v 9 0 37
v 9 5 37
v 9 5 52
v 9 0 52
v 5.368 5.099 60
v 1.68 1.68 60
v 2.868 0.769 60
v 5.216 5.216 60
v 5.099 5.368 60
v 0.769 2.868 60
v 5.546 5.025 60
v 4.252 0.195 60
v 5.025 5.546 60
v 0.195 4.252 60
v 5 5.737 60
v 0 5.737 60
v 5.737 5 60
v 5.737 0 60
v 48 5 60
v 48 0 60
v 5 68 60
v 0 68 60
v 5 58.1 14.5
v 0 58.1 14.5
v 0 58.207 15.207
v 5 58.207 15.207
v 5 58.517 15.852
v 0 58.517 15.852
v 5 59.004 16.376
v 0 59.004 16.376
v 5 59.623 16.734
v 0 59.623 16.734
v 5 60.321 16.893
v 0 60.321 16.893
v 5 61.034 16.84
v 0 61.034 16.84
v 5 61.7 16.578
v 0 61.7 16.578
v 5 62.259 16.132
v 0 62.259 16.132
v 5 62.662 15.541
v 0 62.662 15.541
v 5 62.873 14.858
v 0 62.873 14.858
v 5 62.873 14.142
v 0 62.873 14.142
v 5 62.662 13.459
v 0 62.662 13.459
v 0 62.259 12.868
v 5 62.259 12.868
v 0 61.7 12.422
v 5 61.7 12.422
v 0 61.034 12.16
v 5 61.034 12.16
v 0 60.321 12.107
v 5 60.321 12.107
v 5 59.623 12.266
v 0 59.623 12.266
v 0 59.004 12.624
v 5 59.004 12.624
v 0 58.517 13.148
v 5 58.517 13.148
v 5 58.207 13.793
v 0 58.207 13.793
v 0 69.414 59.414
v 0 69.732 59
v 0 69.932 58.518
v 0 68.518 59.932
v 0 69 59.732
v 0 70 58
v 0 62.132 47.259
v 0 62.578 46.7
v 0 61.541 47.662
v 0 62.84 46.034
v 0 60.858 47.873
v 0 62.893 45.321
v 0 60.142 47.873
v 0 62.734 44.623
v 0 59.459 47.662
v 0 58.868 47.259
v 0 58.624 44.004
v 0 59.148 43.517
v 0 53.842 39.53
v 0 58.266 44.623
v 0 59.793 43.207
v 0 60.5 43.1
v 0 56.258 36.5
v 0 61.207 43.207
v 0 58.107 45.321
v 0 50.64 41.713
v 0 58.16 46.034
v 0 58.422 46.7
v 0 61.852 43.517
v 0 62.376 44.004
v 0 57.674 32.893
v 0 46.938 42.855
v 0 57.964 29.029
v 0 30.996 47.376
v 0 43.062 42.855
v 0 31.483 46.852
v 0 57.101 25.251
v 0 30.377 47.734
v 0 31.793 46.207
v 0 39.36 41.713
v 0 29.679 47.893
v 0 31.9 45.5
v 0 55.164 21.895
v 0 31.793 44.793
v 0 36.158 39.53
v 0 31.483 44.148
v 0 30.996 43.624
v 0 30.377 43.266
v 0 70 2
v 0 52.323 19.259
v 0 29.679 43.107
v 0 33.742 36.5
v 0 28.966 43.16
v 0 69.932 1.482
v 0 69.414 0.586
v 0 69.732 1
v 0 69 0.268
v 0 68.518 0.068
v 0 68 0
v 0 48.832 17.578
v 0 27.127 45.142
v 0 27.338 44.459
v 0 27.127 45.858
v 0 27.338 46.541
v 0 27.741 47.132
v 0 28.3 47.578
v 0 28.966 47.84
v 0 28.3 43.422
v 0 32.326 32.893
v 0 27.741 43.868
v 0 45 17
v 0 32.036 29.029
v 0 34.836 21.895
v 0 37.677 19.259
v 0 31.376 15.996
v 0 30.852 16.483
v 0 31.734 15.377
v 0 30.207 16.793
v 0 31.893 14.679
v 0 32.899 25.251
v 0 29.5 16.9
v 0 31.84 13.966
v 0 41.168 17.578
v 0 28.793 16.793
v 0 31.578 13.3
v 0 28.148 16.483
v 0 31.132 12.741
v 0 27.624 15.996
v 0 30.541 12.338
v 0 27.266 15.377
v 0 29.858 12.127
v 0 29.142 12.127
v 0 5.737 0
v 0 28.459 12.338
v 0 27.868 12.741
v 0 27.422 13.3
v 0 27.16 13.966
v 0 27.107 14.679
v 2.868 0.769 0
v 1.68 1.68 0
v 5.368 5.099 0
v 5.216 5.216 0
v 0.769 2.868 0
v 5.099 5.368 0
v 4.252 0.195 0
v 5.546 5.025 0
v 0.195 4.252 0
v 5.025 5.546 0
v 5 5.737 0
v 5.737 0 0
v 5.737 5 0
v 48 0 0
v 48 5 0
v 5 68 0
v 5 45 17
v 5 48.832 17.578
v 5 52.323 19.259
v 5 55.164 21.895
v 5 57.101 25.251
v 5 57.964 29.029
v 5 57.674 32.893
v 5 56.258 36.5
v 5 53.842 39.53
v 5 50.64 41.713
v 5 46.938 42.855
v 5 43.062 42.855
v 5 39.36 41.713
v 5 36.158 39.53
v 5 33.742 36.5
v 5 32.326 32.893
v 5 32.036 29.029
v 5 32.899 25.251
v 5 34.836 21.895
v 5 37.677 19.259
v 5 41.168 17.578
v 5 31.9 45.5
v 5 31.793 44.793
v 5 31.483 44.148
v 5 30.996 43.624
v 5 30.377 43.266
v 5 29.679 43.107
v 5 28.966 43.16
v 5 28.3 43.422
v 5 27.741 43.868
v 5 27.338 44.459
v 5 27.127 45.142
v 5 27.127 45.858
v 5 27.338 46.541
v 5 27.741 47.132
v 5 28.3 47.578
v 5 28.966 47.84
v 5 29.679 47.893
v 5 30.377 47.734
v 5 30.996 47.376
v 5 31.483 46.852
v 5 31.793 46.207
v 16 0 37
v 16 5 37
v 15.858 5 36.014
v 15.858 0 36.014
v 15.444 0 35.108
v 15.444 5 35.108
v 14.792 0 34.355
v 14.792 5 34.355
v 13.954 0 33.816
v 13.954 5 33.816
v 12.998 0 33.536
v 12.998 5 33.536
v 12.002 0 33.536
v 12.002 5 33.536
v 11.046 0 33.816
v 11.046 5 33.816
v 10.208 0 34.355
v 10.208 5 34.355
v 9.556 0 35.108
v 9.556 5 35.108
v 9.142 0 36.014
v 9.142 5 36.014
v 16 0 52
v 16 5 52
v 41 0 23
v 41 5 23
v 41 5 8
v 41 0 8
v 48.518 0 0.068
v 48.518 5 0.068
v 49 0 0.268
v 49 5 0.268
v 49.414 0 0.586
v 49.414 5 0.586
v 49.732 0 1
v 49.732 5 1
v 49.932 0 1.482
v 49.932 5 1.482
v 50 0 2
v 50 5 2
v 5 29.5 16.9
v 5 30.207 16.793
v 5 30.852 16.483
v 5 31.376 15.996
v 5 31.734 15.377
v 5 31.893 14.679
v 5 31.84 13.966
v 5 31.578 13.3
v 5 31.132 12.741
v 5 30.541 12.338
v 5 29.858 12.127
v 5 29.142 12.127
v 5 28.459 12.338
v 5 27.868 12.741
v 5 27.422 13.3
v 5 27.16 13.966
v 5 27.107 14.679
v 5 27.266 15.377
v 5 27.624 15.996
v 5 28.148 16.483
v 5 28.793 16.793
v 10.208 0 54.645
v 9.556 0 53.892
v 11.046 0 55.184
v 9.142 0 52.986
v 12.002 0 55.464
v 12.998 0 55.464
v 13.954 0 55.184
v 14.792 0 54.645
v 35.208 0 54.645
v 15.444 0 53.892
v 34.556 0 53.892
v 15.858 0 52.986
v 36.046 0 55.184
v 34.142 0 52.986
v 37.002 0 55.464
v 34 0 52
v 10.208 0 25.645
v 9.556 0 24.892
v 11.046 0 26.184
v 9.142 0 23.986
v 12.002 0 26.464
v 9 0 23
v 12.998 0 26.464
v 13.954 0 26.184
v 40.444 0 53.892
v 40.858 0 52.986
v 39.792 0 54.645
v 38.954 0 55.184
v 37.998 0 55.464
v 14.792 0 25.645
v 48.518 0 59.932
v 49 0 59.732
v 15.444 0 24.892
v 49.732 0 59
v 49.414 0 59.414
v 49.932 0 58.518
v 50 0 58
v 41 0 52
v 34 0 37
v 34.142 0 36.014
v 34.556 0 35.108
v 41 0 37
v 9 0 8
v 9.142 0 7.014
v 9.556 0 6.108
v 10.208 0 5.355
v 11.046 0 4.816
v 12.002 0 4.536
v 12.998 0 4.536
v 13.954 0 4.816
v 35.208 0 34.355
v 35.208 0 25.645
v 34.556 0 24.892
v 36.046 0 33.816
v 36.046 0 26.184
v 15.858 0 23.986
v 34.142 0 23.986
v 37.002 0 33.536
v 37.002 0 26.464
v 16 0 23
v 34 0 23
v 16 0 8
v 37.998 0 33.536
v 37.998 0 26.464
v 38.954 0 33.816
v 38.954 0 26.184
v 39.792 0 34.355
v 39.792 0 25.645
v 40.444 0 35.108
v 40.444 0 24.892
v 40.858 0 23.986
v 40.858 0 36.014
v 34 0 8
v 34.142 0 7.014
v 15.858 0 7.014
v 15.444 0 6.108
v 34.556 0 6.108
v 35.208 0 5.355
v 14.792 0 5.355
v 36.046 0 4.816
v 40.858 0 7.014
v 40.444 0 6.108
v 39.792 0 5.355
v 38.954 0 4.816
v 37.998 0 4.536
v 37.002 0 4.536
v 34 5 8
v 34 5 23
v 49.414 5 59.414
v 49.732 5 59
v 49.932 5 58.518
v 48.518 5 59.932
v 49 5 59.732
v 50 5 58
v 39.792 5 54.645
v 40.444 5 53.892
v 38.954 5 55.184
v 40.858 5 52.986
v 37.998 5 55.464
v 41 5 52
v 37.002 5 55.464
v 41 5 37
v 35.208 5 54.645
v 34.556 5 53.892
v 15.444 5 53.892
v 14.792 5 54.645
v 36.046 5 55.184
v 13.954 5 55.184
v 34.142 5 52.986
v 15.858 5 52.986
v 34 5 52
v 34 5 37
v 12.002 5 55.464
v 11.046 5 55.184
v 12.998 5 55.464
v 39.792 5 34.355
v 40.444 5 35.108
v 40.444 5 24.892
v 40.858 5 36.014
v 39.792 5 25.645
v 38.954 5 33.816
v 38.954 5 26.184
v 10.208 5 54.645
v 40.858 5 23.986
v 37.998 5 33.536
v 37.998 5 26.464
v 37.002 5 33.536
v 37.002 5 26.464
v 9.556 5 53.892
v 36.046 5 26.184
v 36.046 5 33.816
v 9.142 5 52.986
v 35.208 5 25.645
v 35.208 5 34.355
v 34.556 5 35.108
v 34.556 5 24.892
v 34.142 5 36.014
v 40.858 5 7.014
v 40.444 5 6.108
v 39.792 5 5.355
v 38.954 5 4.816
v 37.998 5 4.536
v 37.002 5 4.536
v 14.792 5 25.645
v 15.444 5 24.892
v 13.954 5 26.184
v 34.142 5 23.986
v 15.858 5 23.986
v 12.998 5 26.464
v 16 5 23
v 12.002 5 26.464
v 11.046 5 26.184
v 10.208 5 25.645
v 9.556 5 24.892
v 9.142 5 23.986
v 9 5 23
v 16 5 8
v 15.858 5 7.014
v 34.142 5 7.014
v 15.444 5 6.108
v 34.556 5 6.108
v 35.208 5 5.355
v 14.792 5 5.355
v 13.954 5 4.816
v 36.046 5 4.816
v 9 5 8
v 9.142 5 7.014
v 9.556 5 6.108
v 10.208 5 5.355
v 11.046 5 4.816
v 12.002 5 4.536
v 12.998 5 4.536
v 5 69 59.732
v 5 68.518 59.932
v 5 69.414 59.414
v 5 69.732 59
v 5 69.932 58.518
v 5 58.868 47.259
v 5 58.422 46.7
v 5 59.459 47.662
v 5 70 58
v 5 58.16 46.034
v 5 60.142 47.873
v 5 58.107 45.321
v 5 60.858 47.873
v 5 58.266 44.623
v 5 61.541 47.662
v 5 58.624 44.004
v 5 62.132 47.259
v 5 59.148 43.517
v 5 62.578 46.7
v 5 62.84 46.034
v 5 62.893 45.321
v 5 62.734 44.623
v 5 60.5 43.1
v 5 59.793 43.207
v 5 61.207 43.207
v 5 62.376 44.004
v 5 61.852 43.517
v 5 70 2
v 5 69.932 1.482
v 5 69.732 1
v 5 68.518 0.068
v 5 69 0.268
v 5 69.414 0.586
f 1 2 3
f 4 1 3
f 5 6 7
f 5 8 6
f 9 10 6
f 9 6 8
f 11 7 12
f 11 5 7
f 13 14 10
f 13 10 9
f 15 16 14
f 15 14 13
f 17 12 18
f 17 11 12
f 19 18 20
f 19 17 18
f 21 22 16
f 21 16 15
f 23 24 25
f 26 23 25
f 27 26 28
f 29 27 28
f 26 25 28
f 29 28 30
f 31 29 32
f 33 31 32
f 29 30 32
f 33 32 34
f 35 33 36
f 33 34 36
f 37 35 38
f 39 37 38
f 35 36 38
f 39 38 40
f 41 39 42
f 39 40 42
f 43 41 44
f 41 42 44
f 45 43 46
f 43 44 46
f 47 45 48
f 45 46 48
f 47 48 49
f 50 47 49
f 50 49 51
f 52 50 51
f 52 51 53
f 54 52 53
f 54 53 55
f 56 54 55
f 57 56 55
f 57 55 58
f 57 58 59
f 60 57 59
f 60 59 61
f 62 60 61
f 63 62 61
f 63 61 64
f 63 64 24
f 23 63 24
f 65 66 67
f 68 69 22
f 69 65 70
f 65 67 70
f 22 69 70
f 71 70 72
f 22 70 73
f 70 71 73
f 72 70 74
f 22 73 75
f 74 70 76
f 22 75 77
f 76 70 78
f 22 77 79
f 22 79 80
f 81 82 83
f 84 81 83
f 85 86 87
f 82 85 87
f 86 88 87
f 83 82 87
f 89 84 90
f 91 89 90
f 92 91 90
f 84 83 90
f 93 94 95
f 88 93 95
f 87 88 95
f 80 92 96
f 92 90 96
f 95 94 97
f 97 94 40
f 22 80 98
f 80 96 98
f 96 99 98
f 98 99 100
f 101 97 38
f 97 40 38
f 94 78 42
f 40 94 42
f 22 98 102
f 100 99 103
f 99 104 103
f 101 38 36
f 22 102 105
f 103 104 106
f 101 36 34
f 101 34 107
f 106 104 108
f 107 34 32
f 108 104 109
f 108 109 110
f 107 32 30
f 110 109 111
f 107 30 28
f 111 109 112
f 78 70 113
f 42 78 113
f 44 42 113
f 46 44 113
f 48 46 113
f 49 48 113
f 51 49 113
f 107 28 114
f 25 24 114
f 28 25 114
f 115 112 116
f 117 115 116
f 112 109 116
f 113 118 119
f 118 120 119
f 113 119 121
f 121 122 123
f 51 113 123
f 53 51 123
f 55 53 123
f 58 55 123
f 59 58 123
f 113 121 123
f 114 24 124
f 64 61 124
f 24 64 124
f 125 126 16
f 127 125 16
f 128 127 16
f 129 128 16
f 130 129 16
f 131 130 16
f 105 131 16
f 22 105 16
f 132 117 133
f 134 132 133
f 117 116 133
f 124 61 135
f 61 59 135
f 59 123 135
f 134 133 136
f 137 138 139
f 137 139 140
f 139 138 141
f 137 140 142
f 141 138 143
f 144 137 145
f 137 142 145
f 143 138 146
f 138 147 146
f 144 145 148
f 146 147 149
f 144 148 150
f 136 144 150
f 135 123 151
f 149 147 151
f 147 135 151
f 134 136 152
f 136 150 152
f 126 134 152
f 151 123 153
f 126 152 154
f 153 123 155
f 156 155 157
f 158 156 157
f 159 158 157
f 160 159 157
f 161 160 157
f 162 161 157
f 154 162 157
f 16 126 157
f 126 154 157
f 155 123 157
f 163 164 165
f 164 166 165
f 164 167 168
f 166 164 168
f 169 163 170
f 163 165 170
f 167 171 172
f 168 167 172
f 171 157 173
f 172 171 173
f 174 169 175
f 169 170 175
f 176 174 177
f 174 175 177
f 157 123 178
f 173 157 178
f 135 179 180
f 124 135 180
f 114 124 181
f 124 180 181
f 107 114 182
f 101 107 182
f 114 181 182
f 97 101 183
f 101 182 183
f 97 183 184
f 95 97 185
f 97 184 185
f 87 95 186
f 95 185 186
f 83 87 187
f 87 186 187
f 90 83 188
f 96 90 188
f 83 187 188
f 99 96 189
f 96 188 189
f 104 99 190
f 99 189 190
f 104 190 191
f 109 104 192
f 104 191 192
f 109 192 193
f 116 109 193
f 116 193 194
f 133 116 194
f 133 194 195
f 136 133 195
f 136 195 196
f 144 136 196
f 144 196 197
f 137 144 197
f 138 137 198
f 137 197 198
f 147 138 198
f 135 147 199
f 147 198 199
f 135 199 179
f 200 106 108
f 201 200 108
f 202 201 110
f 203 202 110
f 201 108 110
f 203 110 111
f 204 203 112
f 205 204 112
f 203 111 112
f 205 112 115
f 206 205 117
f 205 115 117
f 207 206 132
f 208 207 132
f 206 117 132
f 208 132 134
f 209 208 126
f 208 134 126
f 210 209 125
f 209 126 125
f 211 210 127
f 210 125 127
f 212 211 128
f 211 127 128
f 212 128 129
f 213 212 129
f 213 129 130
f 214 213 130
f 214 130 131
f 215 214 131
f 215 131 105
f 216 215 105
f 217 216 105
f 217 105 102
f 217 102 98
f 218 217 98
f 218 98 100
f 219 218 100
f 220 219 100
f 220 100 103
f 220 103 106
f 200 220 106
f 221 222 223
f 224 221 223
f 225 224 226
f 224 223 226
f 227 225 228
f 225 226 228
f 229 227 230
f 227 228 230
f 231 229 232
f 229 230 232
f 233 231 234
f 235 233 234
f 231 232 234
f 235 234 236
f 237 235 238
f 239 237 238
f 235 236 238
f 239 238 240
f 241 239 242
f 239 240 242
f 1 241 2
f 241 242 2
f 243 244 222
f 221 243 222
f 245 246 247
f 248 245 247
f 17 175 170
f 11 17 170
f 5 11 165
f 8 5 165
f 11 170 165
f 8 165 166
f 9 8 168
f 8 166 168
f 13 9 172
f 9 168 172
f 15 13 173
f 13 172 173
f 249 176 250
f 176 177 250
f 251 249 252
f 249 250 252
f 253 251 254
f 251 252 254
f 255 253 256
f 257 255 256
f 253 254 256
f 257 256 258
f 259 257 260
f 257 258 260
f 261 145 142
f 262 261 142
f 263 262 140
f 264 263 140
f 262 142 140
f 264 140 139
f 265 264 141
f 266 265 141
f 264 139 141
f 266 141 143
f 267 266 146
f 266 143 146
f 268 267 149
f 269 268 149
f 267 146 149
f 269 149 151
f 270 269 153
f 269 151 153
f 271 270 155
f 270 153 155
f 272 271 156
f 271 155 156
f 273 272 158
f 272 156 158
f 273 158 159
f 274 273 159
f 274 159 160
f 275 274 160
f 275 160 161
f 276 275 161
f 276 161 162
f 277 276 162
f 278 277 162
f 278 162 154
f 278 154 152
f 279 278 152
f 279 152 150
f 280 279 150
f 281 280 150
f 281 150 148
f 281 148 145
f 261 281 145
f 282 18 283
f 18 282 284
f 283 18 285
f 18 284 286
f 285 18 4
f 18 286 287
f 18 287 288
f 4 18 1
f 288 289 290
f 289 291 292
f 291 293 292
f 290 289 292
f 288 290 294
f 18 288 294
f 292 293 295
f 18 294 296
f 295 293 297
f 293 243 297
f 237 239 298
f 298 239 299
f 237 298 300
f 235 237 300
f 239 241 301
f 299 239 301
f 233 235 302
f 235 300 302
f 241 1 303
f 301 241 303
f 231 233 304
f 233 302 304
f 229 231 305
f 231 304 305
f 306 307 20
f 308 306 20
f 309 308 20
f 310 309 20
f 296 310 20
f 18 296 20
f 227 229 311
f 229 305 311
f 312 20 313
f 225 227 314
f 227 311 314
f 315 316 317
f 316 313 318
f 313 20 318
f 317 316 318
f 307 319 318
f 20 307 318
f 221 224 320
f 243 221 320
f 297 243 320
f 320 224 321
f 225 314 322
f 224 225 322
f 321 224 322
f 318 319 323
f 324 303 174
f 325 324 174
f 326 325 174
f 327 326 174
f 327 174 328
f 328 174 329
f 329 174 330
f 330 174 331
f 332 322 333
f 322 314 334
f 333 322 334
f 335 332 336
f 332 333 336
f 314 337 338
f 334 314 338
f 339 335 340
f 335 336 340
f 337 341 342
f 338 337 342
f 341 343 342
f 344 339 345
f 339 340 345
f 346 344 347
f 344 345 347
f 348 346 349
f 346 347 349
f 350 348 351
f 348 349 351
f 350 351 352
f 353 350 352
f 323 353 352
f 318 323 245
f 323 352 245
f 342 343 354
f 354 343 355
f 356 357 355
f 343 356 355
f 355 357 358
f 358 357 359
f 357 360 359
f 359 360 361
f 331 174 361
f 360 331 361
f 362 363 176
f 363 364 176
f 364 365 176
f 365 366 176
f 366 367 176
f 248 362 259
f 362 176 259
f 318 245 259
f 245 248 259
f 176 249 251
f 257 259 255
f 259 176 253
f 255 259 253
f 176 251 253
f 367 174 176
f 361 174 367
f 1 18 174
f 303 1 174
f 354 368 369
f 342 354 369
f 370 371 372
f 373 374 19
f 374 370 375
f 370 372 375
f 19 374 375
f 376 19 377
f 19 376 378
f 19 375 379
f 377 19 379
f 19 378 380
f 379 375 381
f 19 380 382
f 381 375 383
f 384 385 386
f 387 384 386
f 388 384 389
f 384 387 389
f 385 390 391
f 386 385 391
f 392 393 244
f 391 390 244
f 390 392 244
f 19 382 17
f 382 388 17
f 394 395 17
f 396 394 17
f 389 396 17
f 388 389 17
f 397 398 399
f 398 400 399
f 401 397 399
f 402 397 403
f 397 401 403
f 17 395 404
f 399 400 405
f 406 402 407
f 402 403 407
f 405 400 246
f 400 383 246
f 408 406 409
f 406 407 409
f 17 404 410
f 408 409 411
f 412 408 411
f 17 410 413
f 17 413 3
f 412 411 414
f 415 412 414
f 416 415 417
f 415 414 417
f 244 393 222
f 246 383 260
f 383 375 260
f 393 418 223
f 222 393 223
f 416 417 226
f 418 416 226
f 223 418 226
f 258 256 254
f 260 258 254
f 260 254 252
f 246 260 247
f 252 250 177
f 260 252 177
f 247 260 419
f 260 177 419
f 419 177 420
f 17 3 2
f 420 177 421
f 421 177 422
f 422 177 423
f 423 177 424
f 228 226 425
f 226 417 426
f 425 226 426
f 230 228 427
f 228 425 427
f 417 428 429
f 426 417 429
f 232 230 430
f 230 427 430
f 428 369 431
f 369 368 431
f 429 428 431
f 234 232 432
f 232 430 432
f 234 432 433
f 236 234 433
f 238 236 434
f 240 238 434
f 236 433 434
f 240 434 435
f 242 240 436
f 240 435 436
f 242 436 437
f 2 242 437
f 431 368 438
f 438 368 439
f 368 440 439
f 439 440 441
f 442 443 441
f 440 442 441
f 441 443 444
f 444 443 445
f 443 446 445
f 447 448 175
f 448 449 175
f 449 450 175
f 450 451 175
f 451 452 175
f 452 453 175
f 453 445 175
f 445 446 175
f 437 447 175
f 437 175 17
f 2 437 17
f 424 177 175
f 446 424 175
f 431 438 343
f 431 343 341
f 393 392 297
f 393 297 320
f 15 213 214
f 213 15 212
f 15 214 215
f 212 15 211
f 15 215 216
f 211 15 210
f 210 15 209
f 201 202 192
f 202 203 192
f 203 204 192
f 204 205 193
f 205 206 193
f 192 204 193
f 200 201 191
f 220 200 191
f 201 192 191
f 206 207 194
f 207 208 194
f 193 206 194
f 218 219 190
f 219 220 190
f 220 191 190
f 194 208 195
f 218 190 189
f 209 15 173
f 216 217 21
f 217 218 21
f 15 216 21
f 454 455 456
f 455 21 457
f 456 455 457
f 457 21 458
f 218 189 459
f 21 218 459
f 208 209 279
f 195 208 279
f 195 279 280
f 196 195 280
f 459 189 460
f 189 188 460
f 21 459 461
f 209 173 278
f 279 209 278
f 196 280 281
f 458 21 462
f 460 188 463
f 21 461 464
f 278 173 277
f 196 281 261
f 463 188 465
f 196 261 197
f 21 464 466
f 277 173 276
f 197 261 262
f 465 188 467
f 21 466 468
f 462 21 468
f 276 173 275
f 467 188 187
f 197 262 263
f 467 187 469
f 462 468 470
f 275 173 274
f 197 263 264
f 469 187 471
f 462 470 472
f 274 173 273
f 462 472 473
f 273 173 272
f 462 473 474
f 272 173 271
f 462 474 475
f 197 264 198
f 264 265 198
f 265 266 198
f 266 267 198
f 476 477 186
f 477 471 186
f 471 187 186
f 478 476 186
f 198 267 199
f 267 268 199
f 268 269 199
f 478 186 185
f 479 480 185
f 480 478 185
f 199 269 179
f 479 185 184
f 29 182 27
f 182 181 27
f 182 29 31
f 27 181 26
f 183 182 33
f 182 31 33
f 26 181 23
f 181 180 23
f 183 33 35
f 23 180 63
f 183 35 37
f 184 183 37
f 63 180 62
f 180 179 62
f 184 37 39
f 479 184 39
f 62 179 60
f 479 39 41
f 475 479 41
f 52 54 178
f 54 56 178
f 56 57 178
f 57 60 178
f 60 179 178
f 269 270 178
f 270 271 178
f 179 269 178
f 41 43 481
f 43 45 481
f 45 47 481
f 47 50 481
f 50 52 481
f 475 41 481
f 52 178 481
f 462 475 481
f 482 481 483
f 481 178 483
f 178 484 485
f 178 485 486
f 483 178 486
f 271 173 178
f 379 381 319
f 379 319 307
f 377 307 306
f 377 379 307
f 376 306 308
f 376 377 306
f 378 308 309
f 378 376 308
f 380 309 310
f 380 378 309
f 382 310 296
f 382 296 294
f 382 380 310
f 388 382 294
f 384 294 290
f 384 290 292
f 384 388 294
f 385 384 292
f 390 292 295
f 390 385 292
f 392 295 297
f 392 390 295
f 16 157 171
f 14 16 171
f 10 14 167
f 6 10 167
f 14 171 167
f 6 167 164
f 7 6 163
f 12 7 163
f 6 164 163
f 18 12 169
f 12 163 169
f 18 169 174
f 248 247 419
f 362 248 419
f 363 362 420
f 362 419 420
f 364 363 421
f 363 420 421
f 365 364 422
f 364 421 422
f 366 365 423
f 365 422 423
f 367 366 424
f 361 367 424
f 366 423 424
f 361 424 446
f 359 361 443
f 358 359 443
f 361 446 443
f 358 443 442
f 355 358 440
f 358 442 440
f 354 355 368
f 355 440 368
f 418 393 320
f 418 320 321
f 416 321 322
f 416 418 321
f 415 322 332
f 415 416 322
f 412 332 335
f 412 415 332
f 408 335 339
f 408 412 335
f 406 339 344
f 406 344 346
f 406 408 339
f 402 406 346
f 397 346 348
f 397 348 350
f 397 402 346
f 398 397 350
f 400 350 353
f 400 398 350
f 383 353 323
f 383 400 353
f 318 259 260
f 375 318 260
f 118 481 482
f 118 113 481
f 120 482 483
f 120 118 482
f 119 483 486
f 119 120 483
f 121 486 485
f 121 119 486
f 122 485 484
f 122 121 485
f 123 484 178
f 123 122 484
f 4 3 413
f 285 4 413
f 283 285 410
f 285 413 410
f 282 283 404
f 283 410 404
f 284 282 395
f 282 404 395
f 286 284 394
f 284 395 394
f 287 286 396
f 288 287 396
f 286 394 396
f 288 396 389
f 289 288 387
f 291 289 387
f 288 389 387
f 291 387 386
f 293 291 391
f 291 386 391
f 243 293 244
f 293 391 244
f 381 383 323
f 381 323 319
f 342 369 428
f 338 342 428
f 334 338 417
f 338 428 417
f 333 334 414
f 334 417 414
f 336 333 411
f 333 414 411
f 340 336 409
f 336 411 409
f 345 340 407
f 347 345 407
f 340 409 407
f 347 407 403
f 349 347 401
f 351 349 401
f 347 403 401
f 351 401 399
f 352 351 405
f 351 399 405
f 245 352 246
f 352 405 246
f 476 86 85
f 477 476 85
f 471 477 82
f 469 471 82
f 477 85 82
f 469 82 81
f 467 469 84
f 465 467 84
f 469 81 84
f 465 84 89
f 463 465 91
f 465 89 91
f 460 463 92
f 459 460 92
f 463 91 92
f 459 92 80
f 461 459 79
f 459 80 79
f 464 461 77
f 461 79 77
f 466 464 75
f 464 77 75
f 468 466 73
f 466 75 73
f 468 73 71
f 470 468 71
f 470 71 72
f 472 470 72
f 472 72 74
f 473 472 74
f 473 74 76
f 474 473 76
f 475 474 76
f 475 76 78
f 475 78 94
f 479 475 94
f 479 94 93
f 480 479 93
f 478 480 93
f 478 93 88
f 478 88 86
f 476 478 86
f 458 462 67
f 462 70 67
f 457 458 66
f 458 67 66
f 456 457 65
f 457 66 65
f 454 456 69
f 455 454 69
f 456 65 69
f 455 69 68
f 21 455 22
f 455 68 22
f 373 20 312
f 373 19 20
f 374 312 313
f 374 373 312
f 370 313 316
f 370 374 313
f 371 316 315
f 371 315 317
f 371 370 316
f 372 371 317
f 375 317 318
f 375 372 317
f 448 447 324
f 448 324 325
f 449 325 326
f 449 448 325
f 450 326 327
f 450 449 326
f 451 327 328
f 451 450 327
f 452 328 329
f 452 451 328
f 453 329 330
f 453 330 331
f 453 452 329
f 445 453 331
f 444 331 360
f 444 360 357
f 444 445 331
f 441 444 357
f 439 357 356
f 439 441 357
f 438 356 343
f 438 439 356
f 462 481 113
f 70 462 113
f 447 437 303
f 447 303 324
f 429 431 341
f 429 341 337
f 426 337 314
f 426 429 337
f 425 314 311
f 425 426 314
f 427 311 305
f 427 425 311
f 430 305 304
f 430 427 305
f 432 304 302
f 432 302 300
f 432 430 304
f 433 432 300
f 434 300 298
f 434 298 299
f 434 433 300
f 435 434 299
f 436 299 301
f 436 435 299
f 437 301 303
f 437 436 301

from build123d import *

# Parameters (mm, degrees)
SM_BASE_FLANGE_1_DEPTH   = 60
SKETCH_6_R               = 13
CUT_EXTRUDE_1_DEPTH      = 5
HOLE_WIZARD_M4_1_D       = 4.8
PATTERN_CIRCULAR_1_COUNT = 4
CUT_EXTRUDE_2_DEPTH      = 5
MIRROR_3_COPY_1_DEPTH    = 5
FILLET_1_R               = 2


# Sheet-metal steps are written as plain solids
with BuildPart() as part:
    # Sketch 1 → 基体-法兰1 (new body)
    with BuildSketch(Plane.XY):
        with BuildLine():
            Line((0, 70), (0, 5.7366))
            ThreePointArc((0, 5.7366), (1.680211239, 1.680211239), (5.7366, 0))
            Line((5.7366, 0), (50, 0))
            Line((50, 0), (50, 5))
            Line((50, 5), (5.7366, 5))
            ThreePointArc((5.7366, 5), (5.215745145, 5.215745145), (5, 5.7366))
            Line((5, 5.7366), (5, 70))
            Line((5, 70), (0, 70))
        make_face()
    extrude(amount=SM_BASE_FLANGE_1_DEPTH)

    # 草图6 → 切除-拉伸1 (cut)
    with BuildSketch(Plane(origin=(5, 0, 0), x_dir=(0, 0, -1), z_dir=(1, 0, 0))):
        with Locations((-30, 45)):
            Circle(SKETCH_6_R)
    extrude(amount=-CUT_EXTRUDE_1_DEPTH, mode=Mode.SUBTRACT)

    # M4 间隙孔1 (through all)
    with Locations(Plane(origin=(5, 60.5, 45.5), x_dir=(0, 0, 1), z_dir=(1, 0, 0))):
        with Locations((0, 0)):
            hole_wizard_m4_1 = Hole(HOLE_WIZARD_M4_1_D / 2)

    # 阵列(圆周)1: M4 间隙孔1 ×4 about axis
    pattern_circular_1_axis = Axis((0, 45, 30), (1, 0, 0))
    for i in range(1, PATTERN_CIRCULAR_1_COUNT):
        add(hole_wizard_m4_1.rotate(pattern_circular_1_axis, i * 360 / PATTERN_CIRCULAR_1_COUNT), mode=Mode.SUBTRACT)

    # 草图9 → 切除-拉伸2 (cut)
    with BuildSketch(Plane(origin=(0, 5, 0), x_dir=(1, 0, 0), z_dir=(0, 1, 0))):
        with BuildLine():
            Line((41, -37), (41, -52))
            ThreePointArc((41, -52), (37.5, -55.5), (34, -52))
            Line((34, -52), (34, -37))
            ThreePointArc((34, -37), (37.5, -33.5), (41, -37))
        make_face()
    cut_extrude_2 = extrude(amount=-CUT_EXTRUDE_2_DEPTH, mode=Mode.SUBTRACT)

    # 镜向2: 切除-拉伸2 across plane
    add(cut_extrude_2.mirror(Plane(origin=(25, 0, 0), x_dir=(0, 0, 1), z_dir=(1, 0, 0))), mode=Mode.SUBTRACT)

    # 镜向3: 切除-拉伸2 across plane
    add(cut_extrude_2.mirror(Plane.XY.offset(30)), mode=Mode.SUBTRACT)

    # 镜向3 copy 1 sketch → 镜向3 copy 1 (cut)
    with BuildSketch(Plane(origin=(50, 5, 60), x_dir=(-1, 0, 0), z_dir=(0, 1, 0))):
        with BuildLine():
            Line((41, -37), (41, -52))
            ThreePointArc((41, -52), (37.5, -55.5), (34, -52))
            Line((34, -52), (34, -37))
            ThreePointArc((34, -37), (37.5, -33.5), (41, -37))
        make_face()
    extrude(amount=-MIRROR_3_COPY_1_DEPTH, mode=Mode.SUBTRACT)

    # 圆角1
    fillet_1_edges = [part.edges().sort_by_distance(p)[0] for p in [
        (50, 2.5, 60),
        (50, 2.5, 0),
        (2.5, 70, 60),
        (2.5, 70, 0),
    ]]
    fillet(fillet_1_edges, radius=FILLET_1_R)


solid = part.part
